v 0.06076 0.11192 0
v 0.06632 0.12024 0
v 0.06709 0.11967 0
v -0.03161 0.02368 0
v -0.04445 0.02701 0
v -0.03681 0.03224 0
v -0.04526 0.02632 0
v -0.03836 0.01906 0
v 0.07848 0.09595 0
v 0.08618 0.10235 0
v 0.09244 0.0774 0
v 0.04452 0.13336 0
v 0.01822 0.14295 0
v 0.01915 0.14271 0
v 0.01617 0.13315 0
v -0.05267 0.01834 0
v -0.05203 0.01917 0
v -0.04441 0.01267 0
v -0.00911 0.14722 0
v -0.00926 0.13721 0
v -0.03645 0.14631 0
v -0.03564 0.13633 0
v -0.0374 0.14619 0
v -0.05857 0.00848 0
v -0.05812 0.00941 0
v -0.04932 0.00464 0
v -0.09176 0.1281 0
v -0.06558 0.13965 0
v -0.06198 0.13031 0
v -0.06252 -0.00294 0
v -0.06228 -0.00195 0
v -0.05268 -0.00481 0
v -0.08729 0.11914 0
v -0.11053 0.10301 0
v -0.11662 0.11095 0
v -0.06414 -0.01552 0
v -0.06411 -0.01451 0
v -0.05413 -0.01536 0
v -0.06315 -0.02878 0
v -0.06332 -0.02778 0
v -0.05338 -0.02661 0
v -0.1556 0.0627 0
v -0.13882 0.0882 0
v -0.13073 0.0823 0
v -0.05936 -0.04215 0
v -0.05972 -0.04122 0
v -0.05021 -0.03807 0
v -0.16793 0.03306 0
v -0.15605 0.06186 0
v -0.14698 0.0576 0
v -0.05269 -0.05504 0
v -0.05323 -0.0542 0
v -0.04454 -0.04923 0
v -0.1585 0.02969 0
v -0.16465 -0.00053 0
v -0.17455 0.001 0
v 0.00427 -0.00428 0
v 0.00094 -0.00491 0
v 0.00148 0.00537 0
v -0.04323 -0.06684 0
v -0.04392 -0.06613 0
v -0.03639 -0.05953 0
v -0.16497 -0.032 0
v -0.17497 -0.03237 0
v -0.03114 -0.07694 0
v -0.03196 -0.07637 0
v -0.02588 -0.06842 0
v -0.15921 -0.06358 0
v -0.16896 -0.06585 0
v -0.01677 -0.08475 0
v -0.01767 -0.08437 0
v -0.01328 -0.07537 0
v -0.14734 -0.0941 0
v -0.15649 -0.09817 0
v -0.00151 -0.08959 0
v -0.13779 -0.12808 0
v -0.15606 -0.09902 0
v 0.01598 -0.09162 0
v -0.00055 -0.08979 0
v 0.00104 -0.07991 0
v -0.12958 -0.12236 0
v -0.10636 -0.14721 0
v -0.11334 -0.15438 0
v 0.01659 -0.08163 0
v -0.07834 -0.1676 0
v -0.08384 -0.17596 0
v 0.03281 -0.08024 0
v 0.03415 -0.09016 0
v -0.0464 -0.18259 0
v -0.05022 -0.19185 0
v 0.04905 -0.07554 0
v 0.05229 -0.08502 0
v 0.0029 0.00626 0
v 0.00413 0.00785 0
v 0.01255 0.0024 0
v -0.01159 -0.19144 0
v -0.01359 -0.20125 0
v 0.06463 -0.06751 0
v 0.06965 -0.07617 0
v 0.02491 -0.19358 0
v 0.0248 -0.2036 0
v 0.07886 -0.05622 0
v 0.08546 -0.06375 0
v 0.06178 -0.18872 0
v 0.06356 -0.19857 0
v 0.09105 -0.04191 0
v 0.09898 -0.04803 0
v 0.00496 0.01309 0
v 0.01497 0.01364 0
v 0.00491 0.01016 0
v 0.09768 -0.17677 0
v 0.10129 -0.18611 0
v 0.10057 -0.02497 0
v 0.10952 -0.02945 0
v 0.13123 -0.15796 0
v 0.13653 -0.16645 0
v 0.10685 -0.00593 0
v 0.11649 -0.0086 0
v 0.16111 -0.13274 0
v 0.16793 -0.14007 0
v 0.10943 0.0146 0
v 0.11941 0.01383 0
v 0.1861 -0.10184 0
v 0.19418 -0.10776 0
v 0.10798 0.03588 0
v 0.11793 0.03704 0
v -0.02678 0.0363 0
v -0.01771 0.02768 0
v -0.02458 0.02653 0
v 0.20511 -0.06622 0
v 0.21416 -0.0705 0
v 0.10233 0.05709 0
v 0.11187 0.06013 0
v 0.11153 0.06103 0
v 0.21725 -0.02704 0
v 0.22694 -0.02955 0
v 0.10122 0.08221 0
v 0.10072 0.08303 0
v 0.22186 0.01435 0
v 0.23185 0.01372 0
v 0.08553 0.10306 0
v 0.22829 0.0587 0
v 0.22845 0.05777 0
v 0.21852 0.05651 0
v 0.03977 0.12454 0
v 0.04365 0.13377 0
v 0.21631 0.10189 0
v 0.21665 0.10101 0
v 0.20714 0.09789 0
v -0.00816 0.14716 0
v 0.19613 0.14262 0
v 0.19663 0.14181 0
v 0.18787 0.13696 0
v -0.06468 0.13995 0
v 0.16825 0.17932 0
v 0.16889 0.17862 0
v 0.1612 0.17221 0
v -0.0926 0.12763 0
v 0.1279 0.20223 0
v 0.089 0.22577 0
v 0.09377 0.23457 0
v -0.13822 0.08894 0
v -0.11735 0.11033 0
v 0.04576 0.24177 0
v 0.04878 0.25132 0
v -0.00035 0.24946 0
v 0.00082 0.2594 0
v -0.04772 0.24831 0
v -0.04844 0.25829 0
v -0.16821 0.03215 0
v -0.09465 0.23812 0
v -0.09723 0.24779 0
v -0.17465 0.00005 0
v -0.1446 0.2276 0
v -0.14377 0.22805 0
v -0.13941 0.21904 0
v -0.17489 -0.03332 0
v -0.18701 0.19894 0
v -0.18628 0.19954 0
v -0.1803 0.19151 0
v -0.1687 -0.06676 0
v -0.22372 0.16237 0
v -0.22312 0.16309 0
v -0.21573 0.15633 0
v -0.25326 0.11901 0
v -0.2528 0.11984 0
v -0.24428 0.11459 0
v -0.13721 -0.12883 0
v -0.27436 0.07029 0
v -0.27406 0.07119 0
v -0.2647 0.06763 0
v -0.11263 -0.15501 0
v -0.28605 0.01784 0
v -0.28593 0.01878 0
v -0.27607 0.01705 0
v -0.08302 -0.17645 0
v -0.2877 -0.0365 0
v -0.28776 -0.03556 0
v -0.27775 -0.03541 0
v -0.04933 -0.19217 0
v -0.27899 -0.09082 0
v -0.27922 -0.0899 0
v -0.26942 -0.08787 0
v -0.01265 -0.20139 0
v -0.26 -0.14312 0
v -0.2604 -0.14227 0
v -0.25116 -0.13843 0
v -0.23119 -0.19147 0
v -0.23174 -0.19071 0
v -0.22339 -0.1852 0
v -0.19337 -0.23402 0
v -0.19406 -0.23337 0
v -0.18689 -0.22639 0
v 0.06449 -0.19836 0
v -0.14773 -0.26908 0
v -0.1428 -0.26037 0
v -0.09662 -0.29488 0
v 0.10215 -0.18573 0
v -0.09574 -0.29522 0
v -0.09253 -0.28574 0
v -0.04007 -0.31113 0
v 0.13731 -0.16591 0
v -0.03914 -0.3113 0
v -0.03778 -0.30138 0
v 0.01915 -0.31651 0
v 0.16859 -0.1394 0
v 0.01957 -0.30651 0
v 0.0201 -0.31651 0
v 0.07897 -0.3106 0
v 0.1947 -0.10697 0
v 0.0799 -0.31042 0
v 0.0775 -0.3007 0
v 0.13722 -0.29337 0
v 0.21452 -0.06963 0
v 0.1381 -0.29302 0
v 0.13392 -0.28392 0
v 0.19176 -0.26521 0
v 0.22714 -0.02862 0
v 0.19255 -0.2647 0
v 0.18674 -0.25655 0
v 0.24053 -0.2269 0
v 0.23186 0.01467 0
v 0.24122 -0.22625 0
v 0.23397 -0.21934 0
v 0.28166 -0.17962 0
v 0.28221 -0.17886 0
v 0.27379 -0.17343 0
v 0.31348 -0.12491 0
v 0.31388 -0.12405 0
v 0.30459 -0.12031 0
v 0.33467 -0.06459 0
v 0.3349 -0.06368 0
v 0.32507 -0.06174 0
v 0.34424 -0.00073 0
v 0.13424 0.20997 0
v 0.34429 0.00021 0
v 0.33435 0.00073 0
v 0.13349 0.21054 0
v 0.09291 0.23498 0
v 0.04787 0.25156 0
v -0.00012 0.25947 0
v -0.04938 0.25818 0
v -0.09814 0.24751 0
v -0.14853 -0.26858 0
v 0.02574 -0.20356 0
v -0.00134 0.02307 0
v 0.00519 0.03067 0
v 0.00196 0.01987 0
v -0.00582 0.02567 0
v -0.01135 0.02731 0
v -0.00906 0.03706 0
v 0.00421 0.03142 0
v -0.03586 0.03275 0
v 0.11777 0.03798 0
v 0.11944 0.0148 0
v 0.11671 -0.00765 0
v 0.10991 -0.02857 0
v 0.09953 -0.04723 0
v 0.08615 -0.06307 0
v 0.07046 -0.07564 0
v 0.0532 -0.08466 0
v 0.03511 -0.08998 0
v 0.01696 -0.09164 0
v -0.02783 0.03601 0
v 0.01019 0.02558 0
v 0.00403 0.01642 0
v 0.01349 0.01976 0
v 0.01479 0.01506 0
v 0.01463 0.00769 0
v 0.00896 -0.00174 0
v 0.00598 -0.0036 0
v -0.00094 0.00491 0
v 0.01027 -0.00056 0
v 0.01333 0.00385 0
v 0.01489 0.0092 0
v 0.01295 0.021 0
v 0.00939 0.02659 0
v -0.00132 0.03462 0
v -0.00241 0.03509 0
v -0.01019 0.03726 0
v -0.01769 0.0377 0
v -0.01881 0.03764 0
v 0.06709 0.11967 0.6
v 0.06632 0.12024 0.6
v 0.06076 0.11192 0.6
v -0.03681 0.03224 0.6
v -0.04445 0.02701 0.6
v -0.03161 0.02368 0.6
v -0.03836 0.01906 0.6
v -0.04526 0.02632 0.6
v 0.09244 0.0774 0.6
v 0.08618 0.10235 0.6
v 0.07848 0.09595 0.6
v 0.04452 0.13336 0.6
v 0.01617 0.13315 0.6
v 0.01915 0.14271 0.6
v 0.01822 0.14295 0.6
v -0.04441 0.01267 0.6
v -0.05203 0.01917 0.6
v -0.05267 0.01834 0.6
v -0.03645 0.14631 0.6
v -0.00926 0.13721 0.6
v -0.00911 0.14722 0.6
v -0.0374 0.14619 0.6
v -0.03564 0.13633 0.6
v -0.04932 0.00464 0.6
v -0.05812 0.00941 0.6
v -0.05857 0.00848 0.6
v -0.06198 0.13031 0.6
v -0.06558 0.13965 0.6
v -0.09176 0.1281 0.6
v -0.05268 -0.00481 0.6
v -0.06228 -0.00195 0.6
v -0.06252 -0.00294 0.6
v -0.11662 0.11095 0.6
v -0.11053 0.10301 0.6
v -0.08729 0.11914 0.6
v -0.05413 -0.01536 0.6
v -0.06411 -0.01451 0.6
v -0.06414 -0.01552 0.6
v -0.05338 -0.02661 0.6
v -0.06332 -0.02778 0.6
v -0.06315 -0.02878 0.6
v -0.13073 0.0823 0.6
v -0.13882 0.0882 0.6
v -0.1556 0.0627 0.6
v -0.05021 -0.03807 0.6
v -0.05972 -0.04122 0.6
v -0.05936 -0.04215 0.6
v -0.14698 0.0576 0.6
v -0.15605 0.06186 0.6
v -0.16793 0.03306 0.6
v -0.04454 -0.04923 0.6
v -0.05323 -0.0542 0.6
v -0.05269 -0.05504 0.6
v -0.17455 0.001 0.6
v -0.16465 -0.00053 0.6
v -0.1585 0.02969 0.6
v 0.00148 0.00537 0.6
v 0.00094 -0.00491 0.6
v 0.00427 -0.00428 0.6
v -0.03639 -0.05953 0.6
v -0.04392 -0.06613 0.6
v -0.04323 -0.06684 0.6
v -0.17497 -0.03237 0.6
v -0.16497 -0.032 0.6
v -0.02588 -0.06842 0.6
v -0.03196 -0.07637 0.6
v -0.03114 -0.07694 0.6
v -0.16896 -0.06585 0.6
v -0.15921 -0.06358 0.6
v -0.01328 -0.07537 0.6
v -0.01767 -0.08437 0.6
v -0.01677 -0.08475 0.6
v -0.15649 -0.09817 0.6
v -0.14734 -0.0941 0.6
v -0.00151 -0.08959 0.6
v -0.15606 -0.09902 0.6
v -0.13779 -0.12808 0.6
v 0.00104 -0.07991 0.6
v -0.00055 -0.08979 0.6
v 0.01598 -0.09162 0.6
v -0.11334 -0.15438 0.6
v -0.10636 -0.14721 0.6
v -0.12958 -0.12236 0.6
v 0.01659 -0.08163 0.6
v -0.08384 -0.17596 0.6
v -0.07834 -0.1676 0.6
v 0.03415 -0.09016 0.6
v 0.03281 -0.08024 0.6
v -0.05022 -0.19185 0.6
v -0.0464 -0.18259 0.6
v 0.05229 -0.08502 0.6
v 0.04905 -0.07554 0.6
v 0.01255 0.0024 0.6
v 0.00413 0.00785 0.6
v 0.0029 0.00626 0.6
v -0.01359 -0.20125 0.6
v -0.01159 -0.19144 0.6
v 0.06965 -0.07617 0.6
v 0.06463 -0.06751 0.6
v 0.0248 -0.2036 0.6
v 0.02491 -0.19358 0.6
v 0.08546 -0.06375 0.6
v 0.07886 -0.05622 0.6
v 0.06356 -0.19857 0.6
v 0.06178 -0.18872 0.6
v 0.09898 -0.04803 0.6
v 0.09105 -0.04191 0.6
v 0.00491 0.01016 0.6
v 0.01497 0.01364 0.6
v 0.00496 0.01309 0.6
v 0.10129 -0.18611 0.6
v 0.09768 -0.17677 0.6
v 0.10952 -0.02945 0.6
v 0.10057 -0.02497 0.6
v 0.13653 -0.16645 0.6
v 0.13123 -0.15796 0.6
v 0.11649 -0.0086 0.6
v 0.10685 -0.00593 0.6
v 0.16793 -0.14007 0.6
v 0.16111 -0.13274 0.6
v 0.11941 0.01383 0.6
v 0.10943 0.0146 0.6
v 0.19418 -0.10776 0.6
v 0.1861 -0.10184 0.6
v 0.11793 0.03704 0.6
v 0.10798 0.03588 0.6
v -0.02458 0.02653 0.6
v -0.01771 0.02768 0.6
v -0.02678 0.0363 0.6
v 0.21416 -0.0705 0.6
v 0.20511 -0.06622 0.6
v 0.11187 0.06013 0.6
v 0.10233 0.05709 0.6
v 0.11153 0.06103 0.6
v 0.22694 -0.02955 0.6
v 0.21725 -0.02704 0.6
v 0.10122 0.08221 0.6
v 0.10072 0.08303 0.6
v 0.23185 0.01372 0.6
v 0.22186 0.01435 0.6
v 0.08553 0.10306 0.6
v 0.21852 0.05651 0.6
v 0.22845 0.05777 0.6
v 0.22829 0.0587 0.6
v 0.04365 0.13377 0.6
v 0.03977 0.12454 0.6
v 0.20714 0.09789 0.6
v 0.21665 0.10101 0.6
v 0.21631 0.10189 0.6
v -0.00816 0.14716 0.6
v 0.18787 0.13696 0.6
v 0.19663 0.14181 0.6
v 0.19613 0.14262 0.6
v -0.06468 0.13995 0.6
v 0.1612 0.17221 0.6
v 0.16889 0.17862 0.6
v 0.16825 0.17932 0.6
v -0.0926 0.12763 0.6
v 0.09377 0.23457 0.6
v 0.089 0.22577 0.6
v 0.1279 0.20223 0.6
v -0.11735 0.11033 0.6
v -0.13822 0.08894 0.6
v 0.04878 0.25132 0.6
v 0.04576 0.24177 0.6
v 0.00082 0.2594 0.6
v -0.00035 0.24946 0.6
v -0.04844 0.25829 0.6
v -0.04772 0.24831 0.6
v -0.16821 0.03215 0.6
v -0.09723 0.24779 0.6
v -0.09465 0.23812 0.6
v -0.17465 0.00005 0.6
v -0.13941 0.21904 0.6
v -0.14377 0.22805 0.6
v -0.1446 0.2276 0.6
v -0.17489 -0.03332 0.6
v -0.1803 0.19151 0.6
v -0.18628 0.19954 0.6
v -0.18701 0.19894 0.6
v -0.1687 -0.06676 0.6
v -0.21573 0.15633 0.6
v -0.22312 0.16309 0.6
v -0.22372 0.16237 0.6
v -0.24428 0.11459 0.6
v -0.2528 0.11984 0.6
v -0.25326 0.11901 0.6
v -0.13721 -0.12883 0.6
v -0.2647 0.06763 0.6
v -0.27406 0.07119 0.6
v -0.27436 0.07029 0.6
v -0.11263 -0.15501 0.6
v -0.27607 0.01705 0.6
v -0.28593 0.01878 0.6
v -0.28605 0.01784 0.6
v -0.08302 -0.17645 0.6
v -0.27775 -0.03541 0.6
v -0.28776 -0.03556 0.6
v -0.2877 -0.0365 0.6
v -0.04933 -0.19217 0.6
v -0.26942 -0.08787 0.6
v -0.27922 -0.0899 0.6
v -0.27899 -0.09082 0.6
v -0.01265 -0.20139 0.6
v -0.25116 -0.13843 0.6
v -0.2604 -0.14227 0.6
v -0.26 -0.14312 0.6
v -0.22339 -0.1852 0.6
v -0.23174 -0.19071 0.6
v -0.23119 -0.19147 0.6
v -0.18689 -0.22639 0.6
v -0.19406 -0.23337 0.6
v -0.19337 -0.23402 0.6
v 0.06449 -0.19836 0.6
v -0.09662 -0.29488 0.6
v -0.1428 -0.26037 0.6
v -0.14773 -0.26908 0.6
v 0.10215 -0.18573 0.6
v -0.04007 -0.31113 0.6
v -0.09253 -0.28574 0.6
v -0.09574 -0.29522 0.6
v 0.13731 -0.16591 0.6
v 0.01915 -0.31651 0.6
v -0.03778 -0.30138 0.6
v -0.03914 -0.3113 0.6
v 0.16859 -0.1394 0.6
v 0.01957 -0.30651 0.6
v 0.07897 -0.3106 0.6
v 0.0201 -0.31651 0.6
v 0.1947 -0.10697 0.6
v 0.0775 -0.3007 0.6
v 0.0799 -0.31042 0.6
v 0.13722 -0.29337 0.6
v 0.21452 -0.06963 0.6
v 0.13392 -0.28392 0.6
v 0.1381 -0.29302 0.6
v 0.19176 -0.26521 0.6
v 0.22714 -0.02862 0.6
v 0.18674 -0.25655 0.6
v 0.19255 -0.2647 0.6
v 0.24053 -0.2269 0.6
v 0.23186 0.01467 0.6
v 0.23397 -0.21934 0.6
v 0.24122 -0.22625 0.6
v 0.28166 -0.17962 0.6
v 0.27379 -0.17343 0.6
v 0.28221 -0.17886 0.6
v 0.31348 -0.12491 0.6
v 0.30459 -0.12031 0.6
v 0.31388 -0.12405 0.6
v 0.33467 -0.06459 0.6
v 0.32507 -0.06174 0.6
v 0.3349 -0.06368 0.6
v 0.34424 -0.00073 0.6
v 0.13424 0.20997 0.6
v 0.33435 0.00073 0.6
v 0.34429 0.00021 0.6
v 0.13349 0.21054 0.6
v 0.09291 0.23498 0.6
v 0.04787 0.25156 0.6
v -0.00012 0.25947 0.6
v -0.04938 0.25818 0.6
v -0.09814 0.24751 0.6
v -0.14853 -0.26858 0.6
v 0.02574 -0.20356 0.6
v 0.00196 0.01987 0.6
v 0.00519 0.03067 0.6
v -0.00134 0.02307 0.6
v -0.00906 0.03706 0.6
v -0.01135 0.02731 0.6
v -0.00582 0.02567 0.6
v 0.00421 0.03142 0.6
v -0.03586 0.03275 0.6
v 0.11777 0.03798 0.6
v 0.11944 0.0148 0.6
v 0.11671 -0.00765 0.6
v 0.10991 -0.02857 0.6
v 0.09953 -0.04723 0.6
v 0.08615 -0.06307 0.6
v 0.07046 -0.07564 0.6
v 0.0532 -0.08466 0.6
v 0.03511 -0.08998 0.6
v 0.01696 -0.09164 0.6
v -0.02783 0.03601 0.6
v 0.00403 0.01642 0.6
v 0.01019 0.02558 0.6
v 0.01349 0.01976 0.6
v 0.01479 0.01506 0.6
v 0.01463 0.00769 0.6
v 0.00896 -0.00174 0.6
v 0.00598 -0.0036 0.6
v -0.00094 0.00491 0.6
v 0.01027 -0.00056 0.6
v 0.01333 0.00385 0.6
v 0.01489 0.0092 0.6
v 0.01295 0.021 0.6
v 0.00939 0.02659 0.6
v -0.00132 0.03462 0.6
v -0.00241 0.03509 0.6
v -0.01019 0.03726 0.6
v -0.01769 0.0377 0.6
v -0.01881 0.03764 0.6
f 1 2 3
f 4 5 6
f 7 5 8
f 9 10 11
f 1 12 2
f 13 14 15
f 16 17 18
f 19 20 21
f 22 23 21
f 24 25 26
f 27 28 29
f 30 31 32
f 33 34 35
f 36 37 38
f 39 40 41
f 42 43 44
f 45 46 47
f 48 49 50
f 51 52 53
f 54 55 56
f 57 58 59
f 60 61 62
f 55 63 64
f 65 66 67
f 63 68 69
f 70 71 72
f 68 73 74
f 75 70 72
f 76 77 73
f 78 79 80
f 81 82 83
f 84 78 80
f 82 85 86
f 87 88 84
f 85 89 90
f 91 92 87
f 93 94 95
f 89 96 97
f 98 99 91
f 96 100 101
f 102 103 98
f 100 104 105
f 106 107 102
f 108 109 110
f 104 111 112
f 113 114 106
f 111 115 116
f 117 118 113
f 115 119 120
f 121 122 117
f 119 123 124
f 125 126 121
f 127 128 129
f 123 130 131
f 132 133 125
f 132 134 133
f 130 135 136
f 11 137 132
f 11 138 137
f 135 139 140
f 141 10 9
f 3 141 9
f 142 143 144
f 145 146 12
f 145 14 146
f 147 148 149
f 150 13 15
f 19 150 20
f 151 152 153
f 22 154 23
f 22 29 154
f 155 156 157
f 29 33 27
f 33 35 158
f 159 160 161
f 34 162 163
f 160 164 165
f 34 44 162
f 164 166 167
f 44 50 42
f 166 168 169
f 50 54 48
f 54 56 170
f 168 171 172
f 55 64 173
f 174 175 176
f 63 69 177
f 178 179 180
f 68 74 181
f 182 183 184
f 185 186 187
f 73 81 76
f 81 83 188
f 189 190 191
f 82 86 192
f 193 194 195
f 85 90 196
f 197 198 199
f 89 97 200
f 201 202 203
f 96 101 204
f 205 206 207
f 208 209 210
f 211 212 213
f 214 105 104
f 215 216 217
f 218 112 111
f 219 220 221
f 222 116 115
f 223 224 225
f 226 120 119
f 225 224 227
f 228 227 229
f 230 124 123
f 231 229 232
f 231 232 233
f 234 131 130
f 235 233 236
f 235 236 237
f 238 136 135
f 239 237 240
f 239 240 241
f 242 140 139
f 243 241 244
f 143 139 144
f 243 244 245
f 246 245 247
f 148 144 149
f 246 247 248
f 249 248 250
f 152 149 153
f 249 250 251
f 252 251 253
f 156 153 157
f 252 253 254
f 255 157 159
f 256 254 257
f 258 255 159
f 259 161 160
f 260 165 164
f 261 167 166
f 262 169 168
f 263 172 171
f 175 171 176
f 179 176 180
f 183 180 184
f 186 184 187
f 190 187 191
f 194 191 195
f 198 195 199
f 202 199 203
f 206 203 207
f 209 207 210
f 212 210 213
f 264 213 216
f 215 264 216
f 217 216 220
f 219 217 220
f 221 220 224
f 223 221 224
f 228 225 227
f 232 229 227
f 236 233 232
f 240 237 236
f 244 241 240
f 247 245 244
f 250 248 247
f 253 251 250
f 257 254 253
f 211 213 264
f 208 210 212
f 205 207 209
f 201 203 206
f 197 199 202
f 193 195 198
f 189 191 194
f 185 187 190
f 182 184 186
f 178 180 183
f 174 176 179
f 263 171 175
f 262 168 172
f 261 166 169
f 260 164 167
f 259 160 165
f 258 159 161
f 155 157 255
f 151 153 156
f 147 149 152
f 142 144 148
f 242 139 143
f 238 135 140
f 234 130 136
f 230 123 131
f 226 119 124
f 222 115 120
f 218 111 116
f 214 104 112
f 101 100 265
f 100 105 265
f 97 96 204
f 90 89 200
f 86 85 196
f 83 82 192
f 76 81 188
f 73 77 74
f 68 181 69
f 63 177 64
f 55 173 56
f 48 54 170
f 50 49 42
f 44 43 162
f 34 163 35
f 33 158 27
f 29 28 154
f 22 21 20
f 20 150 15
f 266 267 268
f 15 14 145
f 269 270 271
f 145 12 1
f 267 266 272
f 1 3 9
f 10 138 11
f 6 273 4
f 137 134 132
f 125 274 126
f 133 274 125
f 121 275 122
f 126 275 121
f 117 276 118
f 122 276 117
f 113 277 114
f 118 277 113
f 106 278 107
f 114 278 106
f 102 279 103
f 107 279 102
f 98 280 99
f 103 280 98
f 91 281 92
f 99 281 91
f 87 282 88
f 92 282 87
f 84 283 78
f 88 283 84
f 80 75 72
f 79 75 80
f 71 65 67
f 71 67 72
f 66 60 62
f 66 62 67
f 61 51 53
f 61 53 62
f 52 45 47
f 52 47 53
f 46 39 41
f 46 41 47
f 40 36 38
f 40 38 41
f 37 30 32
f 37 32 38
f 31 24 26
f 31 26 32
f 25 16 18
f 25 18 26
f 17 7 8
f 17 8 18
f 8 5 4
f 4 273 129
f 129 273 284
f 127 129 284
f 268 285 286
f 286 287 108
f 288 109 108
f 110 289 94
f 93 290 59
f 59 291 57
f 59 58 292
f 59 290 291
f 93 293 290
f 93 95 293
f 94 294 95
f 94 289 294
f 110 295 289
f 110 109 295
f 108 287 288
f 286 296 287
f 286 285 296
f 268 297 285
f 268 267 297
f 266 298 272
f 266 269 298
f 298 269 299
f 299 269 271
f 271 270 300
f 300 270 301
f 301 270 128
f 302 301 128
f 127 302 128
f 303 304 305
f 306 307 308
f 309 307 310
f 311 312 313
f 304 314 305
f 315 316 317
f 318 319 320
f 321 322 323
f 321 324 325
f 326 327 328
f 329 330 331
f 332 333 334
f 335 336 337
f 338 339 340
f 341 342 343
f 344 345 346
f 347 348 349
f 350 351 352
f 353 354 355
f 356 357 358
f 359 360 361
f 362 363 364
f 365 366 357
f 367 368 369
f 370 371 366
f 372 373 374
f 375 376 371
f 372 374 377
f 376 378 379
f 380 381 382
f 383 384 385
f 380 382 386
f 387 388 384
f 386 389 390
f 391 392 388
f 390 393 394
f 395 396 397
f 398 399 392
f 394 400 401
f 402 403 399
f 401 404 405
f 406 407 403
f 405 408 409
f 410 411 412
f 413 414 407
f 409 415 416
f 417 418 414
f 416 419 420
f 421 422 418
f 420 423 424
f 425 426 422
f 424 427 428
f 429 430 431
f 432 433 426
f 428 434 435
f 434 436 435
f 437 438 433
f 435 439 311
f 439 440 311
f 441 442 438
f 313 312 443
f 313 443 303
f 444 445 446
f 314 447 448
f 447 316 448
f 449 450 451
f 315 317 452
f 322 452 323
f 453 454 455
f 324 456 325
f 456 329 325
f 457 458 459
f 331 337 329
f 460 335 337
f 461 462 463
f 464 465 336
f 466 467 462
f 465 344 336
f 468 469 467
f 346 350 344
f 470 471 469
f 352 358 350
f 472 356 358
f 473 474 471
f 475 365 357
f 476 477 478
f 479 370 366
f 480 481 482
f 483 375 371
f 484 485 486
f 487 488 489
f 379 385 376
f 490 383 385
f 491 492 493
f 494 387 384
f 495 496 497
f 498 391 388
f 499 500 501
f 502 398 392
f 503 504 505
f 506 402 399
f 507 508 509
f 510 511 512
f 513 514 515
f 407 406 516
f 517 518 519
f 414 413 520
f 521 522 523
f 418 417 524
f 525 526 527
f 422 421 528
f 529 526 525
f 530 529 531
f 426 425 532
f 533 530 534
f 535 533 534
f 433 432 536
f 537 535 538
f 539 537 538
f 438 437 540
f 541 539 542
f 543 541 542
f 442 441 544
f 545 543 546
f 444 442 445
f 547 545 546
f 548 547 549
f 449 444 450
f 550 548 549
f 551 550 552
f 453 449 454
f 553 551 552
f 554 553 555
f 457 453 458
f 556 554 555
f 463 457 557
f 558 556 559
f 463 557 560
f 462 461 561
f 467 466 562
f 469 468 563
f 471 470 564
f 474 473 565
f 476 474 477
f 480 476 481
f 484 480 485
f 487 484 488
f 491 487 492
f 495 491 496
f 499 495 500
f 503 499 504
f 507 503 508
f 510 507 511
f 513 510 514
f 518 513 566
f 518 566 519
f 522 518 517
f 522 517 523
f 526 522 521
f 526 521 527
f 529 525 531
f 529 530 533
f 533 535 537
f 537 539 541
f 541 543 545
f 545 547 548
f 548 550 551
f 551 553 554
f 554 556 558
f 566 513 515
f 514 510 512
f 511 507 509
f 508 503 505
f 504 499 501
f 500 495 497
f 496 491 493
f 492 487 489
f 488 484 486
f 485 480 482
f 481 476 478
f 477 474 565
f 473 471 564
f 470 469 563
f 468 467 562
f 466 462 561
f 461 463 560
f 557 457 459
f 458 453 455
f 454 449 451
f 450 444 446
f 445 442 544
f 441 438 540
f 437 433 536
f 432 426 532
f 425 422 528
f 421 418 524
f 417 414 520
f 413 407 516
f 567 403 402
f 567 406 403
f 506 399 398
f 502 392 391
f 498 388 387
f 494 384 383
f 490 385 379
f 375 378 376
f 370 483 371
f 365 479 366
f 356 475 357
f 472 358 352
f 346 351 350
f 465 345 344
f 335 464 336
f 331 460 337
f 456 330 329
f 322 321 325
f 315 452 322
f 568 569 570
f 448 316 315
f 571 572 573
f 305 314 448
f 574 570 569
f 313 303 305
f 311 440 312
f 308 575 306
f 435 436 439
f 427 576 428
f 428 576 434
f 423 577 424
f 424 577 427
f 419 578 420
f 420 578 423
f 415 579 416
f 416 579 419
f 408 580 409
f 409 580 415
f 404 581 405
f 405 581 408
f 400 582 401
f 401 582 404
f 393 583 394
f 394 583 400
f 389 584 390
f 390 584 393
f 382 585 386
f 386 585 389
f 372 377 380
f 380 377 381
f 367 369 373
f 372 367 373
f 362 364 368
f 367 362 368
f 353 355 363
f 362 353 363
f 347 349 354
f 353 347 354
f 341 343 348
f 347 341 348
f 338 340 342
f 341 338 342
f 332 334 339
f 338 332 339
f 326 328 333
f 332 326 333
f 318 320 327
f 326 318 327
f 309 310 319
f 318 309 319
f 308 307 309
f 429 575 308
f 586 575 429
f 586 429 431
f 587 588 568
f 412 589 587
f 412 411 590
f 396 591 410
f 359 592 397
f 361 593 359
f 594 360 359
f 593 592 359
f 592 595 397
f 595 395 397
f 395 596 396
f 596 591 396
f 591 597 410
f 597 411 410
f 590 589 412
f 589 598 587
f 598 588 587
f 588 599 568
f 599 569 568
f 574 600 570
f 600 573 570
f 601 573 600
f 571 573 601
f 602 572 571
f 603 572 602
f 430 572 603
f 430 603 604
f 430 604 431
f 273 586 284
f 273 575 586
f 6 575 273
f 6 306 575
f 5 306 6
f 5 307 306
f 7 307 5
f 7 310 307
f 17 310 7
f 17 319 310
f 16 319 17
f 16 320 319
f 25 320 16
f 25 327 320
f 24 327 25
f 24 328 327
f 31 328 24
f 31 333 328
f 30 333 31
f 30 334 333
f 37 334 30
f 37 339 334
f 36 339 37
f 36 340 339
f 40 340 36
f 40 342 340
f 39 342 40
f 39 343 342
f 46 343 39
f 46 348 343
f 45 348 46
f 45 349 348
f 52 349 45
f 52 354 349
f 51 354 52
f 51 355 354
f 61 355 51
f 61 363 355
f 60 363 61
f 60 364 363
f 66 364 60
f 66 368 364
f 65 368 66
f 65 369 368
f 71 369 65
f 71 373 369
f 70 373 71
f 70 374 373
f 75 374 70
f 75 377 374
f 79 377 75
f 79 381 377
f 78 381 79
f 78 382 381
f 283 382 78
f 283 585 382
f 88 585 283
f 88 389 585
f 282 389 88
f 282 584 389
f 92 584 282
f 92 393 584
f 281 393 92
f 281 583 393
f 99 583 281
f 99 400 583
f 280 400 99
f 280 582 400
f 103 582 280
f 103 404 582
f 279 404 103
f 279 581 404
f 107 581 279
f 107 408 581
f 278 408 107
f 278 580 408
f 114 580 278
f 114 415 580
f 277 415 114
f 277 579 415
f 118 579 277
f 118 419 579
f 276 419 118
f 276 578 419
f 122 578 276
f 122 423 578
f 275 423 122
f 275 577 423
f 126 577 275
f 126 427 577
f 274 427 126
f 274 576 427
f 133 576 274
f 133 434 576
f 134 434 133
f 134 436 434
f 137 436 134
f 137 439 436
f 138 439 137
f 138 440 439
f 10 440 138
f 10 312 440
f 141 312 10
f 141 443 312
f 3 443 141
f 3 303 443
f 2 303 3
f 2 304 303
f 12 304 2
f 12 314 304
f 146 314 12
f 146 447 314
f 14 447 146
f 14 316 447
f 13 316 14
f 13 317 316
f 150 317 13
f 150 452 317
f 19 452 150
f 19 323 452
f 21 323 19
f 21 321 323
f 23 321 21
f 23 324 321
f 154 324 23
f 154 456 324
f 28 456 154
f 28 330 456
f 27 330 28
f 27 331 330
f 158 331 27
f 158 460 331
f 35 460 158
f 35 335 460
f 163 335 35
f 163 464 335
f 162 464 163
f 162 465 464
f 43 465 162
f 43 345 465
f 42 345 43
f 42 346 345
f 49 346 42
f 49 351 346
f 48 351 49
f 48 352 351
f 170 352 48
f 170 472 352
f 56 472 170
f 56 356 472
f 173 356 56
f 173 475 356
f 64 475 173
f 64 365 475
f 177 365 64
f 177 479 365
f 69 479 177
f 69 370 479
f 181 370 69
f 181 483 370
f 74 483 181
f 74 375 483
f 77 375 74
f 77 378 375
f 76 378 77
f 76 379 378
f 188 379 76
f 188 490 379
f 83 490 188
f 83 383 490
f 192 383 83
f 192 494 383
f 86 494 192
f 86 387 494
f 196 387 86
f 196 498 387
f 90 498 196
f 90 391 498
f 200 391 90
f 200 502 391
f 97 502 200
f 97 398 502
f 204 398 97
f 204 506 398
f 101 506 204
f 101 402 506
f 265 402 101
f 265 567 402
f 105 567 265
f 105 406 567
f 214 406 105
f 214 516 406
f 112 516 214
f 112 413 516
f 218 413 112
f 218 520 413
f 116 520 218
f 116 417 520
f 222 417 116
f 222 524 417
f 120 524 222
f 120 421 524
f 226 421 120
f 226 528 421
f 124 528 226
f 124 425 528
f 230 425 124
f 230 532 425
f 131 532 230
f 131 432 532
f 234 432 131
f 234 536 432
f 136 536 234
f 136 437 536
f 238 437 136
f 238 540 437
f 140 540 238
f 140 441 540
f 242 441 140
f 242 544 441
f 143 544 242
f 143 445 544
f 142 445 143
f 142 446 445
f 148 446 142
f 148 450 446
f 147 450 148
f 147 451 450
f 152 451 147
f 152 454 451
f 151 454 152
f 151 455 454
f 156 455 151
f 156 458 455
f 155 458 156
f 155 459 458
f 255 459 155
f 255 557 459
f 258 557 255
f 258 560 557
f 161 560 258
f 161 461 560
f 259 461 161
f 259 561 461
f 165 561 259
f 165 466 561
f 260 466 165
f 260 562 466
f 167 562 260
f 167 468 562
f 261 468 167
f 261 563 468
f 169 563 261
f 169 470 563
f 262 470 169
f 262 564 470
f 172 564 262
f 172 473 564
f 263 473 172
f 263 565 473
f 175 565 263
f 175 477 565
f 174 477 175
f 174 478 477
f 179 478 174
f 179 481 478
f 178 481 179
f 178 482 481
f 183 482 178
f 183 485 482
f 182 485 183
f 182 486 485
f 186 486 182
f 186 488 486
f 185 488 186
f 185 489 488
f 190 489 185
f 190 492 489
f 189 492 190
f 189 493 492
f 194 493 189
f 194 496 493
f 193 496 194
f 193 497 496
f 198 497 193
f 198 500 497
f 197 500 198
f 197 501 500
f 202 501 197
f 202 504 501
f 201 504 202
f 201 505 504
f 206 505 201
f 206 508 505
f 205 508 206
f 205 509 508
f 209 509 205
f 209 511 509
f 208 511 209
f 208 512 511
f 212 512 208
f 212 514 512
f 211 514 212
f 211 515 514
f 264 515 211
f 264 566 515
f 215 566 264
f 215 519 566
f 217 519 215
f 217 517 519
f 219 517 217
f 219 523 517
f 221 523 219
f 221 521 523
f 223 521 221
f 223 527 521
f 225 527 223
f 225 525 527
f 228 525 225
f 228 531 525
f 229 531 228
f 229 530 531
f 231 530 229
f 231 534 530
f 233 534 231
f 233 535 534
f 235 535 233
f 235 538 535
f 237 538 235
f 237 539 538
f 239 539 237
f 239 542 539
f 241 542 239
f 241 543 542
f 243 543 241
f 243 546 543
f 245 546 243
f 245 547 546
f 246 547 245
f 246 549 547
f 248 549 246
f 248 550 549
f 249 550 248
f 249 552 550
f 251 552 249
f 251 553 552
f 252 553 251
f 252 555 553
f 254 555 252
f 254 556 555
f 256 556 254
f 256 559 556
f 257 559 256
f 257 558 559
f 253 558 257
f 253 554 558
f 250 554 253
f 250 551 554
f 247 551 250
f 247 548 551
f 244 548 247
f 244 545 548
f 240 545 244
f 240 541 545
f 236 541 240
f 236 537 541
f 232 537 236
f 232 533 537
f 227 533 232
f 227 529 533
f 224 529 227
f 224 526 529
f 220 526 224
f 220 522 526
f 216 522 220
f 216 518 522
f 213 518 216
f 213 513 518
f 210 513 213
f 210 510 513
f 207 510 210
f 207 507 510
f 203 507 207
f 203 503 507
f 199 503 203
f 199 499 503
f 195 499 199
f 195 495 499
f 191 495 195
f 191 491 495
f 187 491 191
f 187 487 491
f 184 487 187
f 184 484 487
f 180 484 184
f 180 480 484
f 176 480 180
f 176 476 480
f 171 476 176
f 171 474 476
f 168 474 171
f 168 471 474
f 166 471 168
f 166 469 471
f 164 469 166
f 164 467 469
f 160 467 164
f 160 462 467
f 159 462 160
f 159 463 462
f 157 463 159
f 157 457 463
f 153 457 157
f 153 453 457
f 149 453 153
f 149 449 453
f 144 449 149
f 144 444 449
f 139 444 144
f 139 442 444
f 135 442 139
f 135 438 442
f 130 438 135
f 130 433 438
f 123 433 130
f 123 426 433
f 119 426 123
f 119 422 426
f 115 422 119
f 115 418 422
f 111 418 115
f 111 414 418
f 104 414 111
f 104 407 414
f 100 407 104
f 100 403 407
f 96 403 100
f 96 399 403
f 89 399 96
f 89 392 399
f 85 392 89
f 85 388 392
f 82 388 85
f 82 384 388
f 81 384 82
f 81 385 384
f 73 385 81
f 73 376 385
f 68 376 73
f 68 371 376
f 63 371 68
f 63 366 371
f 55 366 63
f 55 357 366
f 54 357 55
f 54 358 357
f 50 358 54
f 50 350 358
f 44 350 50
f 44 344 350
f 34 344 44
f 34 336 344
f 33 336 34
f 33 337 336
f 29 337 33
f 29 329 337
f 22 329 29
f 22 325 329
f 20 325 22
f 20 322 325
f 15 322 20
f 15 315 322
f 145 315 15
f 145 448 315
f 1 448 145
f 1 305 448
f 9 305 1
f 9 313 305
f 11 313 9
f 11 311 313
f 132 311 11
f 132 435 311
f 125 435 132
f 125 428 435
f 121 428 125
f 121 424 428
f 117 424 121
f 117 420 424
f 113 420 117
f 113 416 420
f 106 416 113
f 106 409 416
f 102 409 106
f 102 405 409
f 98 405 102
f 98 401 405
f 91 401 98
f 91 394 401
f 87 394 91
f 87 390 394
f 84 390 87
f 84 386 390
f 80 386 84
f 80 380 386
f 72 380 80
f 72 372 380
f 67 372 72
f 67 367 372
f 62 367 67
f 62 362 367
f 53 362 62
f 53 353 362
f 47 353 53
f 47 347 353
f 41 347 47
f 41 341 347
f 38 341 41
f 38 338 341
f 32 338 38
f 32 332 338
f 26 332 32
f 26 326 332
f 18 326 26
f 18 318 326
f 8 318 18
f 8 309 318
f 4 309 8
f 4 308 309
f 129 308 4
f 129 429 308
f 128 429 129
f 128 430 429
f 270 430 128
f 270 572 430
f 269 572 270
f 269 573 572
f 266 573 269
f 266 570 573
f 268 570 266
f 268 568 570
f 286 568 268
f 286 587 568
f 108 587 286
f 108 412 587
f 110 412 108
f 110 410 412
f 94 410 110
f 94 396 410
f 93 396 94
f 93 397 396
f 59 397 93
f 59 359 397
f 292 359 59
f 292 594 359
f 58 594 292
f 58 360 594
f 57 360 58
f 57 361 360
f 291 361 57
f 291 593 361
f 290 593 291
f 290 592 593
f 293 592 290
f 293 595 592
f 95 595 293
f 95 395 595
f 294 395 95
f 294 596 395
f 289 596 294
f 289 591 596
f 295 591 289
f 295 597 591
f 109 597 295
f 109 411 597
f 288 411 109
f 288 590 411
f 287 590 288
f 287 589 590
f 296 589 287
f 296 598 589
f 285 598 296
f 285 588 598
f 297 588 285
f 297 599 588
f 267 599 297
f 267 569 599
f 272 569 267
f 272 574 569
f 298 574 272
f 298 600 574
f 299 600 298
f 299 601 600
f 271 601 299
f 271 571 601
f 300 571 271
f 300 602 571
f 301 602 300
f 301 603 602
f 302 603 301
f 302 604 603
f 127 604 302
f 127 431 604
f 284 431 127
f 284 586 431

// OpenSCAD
// file: lib.scad
function x(v) = v[0];
function y(v) = v[1];
function z(v) = v[2];
function add(v1,v2) = [ for (i = [ 0 : len(v1)-1 ]) v1[i] + v2[i] ];
function xv(d) = [d,0,0];
function yv(d) = [0,d,0];
function zv(d) = [0,0,d];

module box(v) { cube(size=v, center=true); }
module cyl(r1,r2,h) { cylinder(r1=r1, r2=r2, h=h, center=true); }

function grow(n,v) = [x(v)+n*2, y(v)+n*2, z(v)+n*2];

module rbox(v, radius=1) {
	cx = x(v)/2-radius;
	cy = y(v)/2-radius;
	cz = z(v)/2-radius;

	hull() {
		translate([cx,cy,cz]) sphere(r=radius);
		translate([cx,cy,-cz]) sphere(r=radius);
		translate([cx,-cy,cz]) sphere(r=radius);
		translate([cx,-cy,-cz]) sphere(r=radius);
		translate([-cx,cy,cz]) sphere(r=radius);
		translate([-cx,cy,-cz]) sphere(r=radius);
		translate([-cx,-cy,cz]) sphere(r=radius);
		translate([-cx,-cy,-cz]) sphere(r=radius);
	}
}

module fillet(r=1) {
  minkowski() {
    difference() {
      children();
      minkowski() {
        difference() {
          minkowski() {
            children();
            sphere(r=r);
          }
          children();
        }
        sphere(r=r);
      }
    }
    sphere(r=r);
  }
}
// main file
use <lib.scad>

/*************
* Examples *
*************/
// To render an example, remove the comments
pi = 3.1415926536;
e = 2.718281828;
// function to convert degrees to radians
function d2r(theta) = theta*360/(2*pi);

/* Cartesian equations */
/* Sine wave */
//pi = 3.14159;
//function f(x) = 20*sin((1/4)*d2r(x));
//linear_extrude(height=5) 2dgraph([-50, 50], 3, steps=50);

/* Parabola */
//function f(x) = pow(x, 2)/20;
//linear_extrude(height=5)
//	2dgraph([-50, 50], 3, steps=40);

/* Ellipsoid */
//function f(x) = sqrt((2500-pow(x, 2))/3);
//rotate_extrude(convexity=10, $fn=100)
//	rotate([0, 0, -90]) 2dgraph([-50, 50], 3, steps=100);

/* Blancmange curve (an approximation)
works best to export to dxf first, then extrude that.
the 2d render takes a long time at this resolution */
//function blancmange(x, n) = abs(round(pow(2, n)*x)-pow(2, n)*x)/pow(2, n);
//function f(x) = blancmange(x, 0) + blancmange(x, 1) + blancmange(x, 2) + blancmange(x, 3) + blancmange(x, 4) + blancmange(x, 5) + blancmange(x, 6);
////scale([100, 100, 100]) linear_extrude(height=0.125) import_dxf("blancmange.dxf");
//2dgraph([0, 1], 0.02, steps=480);

/* Polar equations */
/* Rose curve */
//function r(theta) = cos(4*theta);
//scale([20, 20, 20]) linear_extrude(height=0.15)
//	2dgraph([0, 720], 0.1, steps=160, polar=true);

/* Archimedes spiral */
function r(theta) = theta/2*pi;
//scale([0.02, 0.02, 0.02]) linear_extrude(height=150)
//	2dgraph([0, 360*3], 50, steps=100, polar=true);

/* Golden spiral */
//function r(theta) = pow(e, 0.0053468*theta);
//linear_extrude(height=50)
//	2dgraph([0, 7*180], 1, steps=300, polar=true);

/* Parametric equations */
/* 9-pointed star */
//function x(t) = cos(t);
//function y(t) = sin(t);
//scale([10, 10, 10]) linear_extrude(height=0.25)
//	2dgraph([10, 1450], 0.1, steps=9, parametric=true);

/* Squiggly */
//function x(t) = sin(d2r(t))*cos(d2r(t)) + sin(2*d2r(t))*cos(2*d2r(t)) + sin(3*d2r(t))*cos(3*d2r(t)) + sin(4*d2r(t))*cos(4*d2r(t));
//function y(t) = sin(d2r(t))*cos(2*d2r(t)) + sin(3*d2r(t))*cos(4*d2r(t)) + sin(5*d2r(t))*cos(6*d2r(t)) + sin(7*d2r(t))*cos(8*d2r(t));
//scale([20, 10, 20]) linear_extrude(height=0.15)
//	2dgraph([0, 3*pi], 0.06, steps=400, parametric=true);

/* Butterfly curve! */
//function x(t) = sin(d2r(t))*(pow(e, cos(d2r(t)))-2*cos(4*d2r(t))-pow(sin(d2r(t)/12), 5));
//function y(t) = cos(d2r(t))*(pow(e, cos(d2r(t)))-2*cos(4*d2r(t))-pow(sin(d2r(t)/12), 5));
////scale([20, 20, 20]) linear_extrude(height=0.25) import_dxf("butterflycurve.dxf");
//2dgraph([0, 20*pi], 0.06, steps=1000, parametric=true);

/*********************
* End of examples *
*********************/

// These functions are here to help get the slope of each segment, and use that to find points for a correctly oriented polygon
function diffx(x1, y1, x2, y2, th) = cos(atan((y2-y1)/(x2-x1)) + 90)*(th/2);
function diffy(x1, y1, x2, y2, th) = sin(atan((y2-y1)/(x2-x1)) + 90)*(th/2);
function point1(x1, y1, x2, y2, th) = [x1-diffx(x1, y1, x2, y2, th), y1-diffy(x1, y1, x2, y2, th)];
function point2(x1, y1, x2, y2, th) = [x2-diffx(x1, y1, x2, y2, th), y2-diffy(x1, y1, x2, y2, th)];
function point3(x1, y1, x2, y2, th) = [x2+diffx(x1, y1, x2, y2, th), y2+diffy(x1, y1, x2, y2, th)];
function point4(x1, y1, x2, y2, th) = [x1+diffx(x1, y1, x2, y2, th), y1+diffy(x1, y1, x2, y2, th)];
function polarX(theta) = cos(theta)*r(theta);
function polarY(theta) = sin(theta)*r(theta);

module nextPolygon(x1, y1, x2, y2, x3, y3, th) {
	if((x2 > x1 && x2-diffx(x2, y2, x3, y3, th) < x2-diffx(x1, y1, x2, y2, th) || (x2 <= x1 && x2-diffx(x2, y2, x3, y3, th) > x2-diffx(x1, y1, x2, y2, th)))) {
		polygon(
			points = [
				point1(x1, y1, x2, y2, th),
				point2(x1, y1, x2, y2, th),
				// This point connects this segment to the next
				point4(x2, y2, x3, y3, th),
				point3(x1, y1, x2, y2, th),
				point4(x1, y1, x2, y2, th)
			],
			paths = [[0,1,2,3,4]]
		);
	}
	else if((x2 > x1 && x2-diffx(x2, y2, x3, y3, th) > x2-diffx(x1, y1, x2, y2, th) || (x2 <= x1 && x2-diffx(x2, y2, x3, y3, th) < x2-diffx(x1, y1, x2, y2, th)))) {
		polygon(
			points = [
				point1(x1, y1, x2, y2, th),
				point2(x1, y1, x2, y2, th),
				// This point connects this segment to the next
				point1(x2, y2, x3, y3, th),
				point3(x1, y1, x2, y2, th),
				point4(x1, y1, x2, y2, th)
			],
			paths = [[0,1,2,3,4]]
		);
	}
	else {
		polygon(
			points = [
				point1(x1, y1, x2, y2, th),
				point2(x1, y1, x2, y2, th),
				point3(x1, y1, x2, y2, th),
				point4(x1, y1, x2, y2, th)
			],
			paths = [[0,1,2,3]]
		);
	}
}

module 2dgraph(bounds=[-10,10], th=2, steps=10, polar=false, parametric=false) {
	step = (bounds[1]-bounds[0])/steps;
	union() {
		for(i = [bounds[0]:step:bounds[1]-step]) {
			if(polar) {
				nextPolygon(polarX(i), polarY(i), polarX(i+step), polarY(i+step), polarX(i+2*step), polarY(i+2*step), th);
			}
			else if(parametric) {
				nextPolygon(x(i), y(i), x(i+step), y(i+step), x(i+2*step), y(i+2*step), th);
			}
			else {
				nextPolygon(i, f(i), i+step, f(i+step), i+2*step, f(i+2*step), th);
			}
		}
	}
}

module spiral() {
	scale([0.02, 0.02, 0.02]) linear_extrude(height=3000)
		2dgraph([0, 360*3], 50, steps=100, polar=true);
}


module sheet() {
	scale([0.01, 0.01, 0.01]) spiral();
}

sheet();
//module plate() {
//	translate([0,0,0.025]) box([0.6,0.6,0.05]);
//}
//
////fillet(0.01, $fn=16) plate();
//plate();
